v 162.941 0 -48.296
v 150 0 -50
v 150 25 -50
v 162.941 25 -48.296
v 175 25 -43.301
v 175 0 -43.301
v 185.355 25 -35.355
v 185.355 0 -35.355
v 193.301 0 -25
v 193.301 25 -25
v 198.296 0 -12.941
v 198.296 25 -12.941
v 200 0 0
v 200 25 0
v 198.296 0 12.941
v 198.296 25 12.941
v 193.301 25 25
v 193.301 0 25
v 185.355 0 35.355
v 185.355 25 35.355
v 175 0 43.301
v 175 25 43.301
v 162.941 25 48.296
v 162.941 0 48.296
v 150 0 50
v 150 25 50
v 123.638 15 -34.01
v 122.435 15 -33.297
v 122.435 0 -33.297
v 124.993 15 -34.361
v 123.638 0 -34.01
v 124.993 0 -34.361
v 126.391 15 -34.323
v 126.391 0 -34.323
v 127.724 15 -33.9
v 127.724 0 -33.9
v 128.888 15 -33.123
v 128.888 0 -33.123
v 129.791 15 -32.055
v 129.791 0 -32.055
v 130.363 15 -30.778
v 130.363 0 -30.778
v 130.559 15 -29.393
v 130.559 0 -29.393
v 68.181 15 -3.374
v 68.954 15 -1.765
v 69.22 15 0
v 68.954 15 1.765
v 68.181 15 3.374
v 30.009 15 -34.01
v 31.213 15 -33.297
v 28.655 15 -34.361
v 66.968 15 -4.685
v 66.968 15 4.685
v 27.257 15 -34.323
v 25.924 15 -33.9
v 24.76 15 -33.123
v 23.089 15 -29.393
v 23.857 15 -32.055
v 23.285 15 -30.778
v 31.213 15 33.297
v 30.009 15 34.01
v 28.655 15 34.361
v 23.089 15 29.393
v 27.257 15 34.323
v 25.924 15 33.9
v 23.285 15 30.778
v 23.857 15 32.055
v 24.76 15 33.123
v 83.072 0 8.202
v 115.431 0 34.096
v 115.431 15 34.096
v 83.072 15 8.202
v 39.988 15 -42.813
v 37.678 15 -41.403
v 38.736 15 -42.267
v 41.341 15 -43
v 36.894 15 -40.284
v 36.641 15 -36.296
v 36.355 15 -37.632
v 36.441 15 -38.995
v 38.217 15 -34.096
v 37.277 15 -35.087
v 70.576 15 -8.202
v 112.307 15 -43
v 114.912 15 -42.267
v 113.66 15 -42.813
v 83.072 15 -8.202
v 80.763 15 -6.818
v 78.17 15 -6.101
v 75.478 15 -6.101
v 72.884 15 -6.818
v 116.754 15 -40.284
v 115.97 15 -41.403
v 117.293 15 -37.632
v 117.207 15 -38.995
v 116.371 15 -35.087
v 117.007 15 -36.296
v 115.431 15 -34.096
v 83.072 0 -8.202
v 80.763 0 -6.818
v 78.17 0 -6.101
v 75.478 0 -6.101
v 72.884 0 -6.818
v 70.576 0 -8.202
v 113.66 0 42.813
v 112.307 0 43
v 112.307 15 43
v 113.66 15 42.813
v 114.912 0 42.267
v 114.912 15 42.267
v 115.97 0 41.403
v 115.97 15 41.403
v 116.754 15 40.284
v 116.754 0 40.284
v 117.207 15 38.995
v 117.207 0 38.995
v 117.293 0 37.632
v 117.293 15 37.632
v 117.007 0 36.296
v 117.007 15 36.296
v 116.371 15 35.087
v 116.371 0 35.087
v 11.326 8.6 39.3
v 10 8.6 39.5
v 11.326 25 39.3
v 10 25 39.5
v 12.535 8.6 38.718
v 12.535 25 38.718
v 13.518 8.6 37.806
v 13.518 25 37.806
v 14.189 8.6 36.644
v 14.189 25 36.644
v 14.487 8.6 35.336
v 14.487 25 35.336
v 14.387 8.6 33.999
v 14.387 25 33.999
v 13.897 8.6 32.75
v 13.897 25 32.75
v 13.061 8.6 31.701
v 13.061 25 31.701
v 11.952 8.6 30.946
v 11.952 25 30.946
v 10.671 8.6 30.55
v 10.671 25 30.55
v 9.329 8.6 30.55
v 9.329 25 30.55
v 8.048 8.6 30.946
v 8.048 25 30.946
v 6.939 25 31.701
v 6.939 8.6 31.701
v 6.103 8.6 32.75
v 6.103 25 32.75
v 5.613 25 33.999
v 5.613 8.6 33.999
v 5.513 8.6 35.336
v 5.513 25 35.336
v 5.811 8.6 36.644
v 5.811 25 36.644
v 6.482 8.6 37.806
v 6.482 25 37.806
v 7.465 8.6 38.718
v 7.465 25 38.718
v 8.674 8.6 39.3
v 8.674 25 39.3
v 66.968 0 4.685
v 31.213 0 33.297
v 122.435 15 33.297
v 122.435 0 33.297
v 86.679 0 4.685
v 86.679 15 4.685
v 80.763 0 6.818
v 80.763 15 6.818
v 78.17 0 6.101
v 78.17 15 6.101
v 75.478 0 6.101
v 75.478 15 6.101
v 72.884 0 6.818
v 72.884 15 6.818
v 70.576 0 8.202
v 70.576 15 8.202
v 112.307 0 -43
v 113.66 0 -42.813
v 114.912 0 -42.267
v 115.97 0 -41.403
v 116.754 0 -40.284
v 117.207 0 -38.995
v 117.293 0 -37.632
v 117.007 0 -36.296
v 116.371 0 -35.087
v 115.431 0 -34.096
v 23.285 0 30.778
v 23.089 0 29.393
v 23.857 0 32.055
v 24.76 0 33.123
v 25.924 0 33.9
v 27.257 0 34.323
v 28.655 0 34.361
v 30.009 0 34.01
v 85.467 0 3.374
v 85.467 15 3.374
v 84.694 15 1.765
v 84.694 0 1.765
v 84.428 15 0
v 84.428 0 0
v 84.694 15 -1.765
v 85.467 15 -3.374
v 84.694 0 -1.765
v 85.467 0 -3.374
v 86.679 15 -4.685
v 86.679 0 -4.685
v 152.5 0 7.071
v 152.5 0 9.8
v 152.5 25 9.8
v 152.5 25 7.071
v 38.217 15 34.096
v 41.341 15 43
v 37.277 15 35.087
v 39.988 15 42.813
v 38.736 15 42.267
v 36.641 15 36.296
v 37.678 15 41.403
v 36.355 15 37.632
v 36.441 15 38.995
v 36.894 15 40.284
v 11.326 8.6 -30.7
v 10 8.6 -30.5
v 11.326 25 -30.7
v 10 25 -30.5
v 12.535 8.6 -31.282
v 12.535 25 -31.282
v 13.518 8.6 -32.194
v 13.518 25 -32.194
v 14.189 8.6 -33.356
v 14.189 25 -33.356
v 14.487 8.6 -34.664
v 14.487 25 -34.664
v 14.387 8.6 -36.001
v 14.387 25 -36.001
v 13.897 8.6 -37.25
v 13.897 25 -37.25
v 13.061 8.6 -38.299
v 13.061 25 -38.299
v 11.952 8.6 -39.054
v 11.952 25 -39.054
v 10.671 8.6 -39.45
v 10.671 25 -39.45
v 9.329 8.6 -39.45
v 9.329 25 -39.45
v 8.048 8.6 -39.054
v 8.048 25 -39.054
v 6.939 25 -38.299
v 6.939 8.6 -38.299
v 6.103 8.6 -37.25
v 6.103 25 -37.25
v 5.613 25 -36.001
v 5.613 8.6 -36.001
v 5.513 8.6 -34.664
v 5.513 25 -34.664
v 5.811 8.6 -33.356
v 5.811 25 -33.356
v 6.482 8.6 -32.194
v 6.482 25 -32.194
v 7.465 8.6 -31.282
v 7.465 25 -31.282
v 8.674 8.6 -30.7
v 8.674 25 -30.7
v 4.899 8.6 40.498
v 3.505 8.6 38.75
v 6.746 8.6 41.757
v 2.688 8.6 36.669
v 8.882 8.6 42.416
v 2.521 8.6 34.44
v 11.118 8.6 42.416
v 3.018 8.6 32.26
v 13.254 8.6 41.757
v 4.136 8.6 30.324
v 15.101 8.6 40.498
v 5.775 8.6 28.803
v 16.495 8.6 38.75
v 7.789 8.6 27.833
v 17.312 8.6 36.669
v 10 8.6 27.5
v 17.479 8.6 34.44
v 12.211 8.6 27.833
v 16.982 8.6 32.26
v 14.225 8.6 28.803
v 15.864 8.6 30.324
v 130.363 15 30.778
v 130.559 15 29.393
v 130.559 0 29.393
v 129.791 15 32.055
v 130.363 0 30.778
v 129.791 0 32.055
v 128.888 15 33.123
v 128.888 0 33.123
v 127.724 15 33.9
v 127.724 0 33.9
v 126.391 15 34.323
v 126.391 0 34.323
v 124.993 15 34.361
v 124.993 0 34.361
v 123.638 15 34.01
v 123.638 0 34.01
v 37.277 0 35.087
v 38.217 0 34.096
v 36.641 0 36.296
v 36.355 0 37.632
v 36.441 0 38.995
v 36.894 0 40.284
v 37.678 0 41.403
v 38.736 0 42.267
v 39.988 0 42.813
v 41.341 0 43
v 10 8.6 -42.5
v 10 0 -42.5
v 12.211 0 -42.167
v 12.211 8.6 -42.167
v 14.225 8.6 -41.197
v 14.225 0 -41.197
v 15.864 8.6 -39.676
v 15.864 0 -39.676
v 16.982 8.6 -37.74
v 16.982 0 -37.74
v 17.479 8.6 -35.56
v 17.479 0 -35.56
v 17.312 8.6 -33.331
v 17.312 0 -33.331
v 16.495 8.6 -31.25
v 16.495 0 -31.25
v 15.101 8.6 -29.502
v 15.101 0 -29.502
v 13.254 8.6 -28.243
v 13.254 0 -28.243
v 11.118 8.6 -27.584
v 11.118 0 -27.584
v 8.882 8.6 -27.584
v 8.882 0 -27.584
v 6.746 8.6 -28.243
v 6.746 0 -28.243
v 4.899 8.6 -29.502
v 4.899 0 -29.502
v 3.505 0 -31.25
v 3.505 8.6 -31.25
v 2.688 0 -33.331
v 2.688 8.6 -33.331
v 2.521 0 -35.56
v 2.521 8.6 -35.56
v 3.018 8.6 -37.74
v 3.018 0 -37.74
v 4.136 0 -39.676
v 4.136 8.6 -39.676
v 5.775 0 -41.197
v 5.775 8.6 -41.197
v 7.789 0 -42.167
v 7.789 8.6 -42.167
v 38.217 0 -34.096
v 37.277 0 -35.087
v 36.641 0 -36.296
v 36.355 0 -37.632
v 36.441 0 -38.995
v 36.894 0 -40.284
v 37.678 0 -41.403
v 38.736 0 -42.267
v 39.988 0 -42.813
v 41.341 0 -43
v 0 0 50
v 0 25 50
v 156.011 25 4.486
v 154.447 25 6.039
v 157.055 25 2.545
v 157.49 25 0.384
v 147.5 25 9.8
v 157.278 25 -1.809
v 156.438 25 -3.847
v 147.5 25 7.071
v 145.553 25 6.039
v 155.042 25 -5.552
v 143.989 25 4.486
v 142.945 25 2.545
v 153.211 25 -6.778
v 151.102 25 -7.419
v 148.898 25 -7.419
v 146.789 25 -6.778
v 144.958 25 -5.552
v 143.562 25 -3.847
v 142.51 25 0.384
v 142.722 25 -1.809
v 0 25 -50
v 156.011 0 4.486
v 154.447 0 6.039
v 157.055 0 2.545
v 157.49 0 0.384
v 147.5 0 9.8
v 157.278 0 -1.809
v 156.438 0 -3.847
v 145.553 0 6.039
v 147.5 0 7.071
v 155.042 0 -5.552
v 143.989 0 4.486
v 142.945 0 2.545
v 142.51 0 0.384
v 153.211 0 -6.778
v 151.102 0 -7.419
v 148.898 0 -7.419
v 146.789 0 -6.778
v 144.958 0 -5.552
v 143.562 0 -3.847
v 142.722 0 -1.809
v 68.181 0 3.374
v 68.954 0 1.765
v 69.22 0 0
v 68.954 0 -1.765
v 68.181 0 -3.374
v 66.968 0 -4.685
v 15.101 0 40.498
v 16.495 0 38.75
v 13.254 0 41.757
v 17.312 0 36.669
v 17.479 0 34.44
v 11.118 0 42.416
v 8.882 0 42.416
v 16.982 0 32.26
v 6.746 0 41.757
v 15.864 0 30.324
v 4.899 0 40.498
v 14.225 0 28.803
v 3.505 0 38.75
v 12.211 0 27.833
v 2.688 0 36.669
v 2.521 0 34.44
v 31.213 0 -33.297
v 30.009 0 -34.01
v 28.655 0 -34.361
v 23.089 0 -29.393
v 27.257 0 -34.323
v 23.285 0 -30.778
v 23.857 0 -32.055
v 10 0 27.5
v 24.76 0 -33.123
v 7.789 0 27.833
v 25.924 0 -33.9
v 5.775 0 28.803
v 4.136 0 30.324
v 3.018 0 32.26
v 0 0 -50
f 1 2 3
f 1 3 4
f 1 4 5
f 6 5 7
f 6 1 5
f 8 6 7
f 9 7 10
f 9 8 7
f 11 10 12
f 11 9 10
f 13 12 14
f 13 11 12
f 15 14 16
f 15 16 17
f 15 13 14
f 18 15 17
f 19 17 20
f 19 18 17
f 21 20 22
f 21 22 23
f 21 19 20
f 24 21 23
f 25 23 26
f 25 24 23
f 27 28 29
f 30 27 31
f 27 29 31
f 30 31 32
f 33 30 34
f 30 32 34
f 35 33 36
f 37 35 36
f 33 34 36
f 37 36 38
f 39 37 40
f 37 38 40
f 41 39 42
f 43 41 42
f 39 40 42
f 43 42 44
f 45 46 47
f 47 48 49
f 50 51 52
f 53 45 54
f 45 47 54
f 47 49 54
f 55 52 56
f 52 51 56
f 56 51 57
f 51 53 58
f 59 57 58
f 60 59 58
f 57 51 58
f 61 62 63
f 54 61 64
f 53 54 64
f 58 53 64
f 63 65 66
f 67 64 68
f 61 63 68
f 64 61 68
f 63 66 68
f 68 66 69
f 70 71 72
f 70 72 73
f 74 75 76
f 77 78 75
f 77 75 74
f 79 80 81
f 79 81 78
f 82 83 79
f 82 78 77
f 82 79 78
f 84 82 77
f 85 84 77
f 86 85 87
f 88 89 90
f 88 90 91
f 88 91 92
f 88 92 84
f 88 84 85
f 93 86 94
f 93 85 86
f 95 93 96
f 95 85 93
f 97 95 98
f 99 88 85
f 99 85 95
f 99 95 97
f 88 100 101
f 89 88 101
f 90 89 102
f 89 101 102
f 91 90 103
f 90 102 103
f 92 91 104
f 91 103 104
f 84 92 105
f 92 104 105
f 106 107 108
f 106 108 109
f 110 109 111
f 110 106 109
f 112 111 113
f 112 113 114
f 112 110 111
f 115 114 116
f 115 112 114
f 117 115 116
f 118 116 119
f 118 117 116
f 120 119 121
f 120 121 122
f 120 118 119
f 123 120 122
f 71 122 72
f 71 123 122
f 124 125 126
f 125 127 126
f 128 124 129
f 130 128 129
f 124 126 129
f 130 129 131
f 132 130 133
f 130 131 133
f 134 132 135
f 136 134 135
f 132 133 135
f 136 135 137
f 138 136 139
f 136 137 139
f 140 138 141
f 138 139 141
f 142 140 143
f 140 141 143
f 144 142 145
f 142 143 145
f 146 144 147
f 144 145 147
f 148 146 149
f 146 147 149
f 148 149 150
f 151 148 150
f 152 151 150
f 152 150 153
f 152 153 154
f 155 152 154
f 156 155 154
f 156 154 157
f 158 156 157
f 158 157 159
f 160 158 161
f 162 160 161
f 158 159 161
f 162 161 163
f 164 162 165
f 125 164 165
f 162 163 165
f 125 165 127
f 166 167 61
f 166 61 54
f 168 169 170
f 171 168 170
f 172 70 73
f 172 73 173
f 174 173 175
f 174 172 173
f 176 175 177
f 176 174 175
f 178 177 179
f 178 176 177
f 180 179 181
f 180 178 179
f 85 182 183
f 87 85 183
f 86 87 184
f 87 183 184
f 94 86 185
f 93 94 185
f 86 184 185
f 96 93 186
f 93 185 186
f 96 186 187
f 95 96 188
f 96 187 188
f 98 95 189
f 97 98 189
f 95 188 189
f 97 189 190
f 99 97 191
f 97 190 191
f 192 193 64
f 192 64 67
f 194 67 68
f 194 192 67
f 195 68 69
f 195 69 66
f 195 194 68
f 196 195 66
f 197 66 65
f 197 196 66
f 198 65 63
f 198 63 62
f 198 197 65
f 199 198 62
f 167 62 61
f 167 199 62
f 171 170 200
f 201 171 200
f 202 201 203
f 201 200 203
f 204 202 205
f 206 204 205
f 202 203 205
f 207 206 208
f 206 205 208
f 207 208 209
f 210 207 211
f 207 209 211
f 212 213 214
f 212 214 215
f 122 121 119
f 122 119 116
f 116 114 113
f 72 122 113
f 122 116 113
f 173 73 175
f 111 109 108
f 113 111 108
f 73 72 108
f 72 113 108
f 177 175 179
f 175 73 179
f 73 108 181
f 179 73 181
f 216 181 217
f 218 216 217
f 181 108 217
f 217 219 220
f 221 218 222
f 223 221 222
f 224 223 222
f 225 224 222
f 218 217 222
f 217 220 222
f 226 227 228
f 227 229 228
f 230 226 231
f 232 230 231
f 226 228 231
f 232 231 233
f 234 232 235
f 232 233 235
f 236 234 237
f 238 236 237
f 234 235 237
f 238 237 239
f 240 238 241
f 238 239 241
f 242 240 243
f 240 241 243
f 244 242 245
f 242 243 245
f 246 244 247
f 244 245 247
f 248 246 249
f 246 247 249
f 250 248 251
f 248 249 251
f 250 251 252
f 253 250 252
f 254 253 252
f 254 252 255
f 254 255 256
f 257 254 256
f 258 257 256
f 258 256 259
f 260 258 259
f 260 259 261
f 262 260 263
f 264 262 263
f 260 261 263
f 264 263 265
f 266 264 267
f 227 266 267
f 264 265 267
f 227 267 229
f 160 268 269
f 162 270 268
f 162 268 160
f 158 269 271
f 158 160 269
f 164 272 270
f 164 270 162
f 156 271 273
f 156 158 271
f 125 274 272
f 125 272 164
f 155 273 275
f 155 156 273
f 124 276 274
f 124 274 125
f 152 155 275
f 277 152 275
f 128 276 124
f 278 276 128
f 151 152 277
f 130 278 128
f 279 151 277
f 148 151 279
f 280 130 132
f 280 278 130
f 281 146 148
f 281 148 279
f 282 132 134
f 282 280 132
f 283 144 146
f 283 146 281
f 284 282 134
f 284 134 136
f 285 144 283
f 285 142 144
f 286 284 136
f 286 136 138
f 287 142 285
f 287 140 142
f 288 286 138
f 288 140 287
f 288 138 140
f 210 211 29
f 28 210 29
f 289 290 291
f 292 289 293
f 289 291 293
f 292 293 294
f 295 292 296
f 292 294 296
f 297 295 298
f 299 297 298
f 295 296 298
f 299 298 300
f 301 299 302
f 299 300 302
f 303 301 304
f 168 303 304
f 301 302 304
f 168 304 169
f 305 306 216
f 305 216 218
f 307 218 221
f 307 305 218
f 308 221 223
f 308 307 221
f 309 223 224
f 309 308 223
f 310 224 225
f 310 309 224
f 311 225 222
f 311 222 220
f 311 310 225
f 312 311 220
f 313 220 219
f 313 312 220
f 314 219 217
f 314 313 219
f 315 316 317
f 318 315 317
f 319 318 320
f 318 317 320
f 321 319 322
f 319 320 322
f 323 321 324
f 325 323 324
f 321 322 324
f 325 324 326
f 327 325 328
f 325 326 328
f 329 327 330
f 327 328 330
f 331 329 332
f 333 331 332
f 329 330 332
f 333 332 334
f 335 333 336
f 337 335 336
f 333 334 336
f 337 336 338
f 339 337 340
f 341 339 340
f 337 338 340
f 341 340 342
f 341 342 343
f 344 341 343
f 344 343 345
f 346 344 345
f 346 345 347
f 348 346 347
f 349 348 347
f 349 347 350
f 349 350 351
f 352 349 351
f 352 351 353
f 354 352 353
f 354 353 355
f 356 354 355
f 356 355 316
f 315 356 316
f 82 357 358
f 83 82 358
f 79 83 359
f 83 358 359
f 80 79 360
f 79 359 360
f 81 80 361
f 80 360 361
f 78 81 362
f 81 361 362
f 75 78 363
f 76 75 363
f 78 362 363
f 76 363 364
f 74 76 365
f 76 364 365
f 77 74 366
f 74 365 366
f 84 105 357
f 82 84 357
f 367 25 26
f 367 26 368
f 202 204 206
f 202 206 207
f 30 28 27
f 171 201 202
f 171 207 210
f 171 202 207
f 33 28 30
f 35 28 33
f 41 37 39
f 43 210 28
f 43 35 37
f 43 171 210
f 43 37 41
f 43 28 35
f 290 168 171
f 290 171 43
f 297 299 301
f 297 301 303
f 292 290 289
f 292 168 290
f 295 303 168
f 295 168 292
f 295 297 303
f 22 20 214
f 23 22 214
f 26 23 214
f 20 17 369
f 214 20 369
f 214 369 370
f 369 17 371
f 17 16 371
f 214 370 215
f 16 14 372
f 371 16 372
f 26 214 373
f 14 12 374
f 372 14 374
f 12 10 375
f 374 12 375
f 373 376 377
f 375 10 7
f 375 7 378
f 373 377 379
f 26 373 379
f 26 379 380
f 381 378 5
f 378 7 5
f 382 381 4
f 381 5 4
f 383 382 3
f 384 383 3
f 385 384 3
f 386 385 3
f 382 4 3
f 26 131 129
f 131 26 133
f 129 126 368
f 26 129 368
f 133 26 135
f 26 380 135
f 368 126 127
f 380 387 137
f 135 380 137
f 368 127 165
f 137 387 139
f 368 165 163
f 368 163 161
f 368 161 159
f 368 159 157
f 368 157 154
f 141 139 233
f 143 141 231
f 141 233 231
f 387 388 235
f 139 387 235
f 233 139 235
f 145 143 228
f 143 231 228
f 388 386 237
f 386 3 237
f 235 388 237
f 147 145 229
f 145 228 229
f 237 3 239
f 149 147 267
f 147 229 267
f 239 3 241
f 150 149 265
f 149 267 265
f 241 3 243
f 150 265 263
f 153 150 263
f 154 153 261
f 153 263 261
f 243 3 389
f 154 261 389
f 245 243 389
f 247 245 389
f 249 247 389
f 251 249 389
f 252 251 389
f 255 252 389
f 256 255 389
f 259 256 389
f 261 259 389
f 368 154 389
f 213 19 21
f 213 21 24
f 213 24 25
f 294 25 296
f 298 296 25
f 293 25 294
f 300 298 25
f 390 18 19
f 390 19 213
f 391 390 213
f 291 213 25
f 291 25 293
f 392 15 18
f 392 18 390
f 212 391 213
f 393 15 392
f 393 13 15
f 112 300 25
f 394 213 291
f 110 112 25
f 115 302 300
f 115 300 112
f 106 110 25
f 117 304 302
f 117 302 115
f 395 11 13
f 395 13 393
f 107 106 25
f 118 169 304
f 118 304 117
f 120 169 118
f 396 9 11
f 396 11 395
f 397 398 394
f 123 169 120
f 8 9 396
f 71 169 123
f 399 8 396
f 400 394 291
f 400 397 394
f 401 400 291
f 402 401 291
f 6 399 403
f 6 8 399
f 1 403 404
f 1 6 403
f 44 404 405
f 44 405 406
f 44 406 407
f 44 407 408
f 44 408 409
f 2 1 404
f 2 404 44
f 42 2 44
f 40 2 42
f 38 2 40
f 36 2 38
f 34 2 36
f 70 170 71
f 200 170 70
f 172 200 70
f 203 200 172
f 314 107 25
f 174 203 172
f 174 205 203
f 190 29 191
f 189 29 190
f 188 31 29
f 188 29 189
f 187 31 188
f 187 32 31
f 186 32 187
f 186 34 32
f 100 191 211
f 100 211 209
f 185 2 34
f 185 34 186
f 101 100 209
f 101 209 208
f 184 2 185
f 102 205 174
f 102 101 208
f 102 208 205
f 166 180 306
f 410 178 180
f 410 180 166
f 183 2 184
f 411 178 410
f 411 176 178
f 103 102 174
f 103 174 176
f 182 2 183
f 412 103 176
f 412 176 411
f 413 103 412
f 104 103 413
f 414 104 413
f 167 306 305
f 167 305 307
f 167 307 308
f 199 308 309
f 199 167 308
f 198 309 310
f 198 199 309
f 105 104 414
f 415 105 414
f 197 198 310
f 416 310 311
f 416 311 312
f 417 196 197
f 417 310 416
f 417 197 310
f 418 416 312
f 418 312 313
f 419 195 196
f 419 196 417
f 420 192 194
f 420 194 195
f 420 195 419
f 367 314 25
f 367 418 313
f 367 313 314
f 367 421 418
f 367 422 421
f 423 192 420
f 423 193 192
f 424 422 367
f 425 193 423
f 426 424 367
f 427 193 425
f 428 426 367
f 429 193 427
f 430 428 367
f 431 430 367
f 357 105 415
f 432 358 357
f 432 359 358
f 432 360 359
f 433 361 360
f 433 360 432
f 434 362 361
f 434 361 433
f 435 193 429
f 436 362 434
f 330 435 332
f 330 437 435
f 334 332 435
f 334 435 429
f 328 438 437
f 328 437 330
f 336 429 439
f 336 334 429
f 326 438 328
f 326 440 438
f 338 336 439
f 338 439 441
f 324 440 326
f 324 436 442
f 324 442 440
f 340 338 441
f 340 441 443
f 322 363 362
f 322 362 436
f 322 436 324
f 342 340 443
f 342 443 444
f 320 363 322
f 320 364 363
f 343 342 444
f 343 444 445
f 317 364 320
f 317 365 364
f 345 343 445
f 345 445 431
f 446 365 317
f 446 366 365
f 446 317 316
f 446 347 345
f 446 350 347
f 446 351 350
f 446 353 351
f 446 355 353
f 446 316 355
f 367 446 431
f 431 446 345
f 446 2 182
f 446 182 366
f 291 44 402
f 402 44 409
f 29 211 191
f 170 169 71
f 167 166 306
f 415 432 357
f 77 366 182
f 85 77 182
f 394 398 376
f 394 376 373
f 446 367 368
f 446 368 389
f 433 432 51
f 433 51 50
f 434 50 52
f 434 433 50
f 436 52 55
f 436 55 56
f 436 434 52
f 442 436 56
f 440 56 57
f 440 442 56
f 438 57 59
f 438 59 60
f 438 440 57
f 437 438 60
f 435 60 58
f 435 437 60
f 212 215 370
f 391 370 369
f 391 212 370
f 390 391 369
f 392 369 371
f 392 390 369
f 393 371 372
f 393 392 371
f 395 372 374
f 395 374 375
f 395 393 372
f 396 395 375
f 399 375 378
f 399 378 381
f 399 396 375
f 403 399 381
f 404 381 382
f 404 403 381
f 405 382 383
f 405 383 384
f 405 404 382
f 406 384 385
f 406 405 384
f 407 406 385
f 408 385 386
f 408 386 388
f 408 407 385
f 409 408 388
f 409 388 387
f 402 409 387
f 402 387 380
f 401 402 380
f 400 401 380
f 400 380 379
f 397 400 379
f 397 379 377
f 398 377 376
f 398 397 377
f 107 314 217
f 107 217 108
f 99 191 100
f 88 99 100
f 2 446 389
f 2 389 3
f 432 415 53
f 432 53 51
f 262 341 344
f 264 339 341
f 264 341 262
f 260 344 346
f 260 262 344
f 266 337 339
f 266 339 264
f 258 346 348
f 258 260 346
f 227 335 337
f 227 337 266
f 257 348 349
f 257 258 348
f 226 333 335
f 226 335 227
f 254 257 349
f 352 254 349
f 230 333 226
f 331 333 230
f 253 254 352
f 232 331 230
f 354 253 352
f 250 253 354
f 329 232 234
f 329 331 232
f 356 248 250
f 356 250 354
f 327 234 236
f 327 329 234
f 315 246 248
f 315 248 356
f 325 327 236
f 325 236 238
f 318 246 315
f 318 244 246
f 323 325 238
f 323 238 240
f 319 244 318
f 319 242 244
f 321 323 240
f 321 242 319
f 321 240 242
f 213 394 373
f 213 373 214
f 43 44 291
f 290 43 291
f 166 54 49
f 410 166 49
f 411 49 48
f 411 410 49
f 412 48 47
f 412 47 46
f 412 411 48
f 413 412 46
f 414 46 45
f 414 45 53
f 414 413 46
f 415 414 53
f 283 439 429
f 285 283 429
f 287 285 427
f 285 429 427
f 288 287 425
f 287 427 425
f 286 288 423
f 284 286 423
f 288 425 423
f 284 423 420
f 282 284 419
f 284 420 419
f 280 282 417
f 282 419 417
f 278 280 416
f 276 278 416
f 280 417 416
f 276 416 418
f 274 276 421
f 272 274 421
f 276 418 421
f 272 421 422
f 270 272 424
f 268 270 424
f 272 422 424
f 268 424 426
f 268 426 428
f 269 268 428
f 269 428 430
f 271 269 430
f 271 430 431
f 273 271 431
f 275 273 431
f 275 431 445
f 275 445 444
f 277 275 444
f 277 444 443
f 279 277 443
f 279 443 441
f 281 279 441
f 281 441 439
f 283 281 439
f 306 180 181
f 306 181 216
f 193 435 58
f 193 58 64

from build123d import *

# Parameters (mm, degrees)
DODANIE_WYCI_GNI_CIE1_DEPTH                         = 25
POG_BIENIE_WALCOWE_POD_M8_WKR_T_Z_BEM_W_D           = 9
POG_BIENIE_WALCOWE_POD_M8_WKR_T_Z_BEM_W_DEPTH       = 26.25
POG_BIENIE_WALCOWE_POD_M8_WKR_T_Z_BEM_W_CBORE_D     = 15
POG_BIENIE_WALCOWE_POD_M8_WKR_T_Z_BEM_W_CBORE_DEPTH = 8.6
POG_BIENIE_WALCOWE_POD_M8_WKR_T_Z_BEM_W_TIP         = 2.703872786
WYTNIJ_WYCI_GNI_CIE1_DEPTH                          = 15


with BuildPart() as part:
    # Szkic1 → Dodanie-wyciągnięcie1 (new body)
    with BuildSketch(Plane(origin=(0, 0, 0), x_dir=(1, 0, 0), z_dir=(0, 1, 0))):
        with BuildLine():
            Line((0, -50), (0, 50))
            Line((0, 50), (150, 50))
            ThreePointArc((150, 50), (200, 0), (150, -50))
            Line((150, -50), (0, -50))
        make_face()
        with BuildLine():
            Line((147.5, -9.8), (152.5, -9.8))
            Line((152.5, -9.8), (152.5, -7.071067812))
            ThreePointArc((152.5, -7.071067812), (150, 7.5), (147.5, -7.071067812))
            Line((147.5, -7.071067812), (147.5, -9.8))
        make_face(mode=Mode.SUBTRACT)
    extrude(amount=DODANIE_WYCI_GNI_CIE1_DEPTH)

    # Pogłębienie walcowe pod M8 Wkręt z łbem walcowym z gniazdem sześciokątnym1
    with Locations(Plane(origin=(10, 0, 35), x_dir=(0, 0, -1), z_dir=(0, -1, 0))):
        with Locations((0, 0), (70, 0)):
            CounterBoreHole(POG_BIENIE_WALCOWE_POD_M8_WKR_T_Z_BEM_W_D / 2, POG_BIENIE_WALCOWE_POD_M8_WKR_T_Z_BEM_W_CBORE_D / 2, POG_BIENIE_WALCOWE_POD_M8_WKR_T_Z_BEM_W_CBORE_DEPTH, depth=POG_BIENIE_WALCOWE_POD_M8_WKR_T_Z_BEM_W_DEPTH)
            with Locations((0, 0, -(POG_BIENIE_WALCOWE_POD_M8_WKR_T_Z_BEM_W_DEPTH + POG_BIENIE_WALCOWE_POD_M8_WKR_T_Z_BEM_W_TIP / 2))):  # 118° drill point
                Cone(0, POG_BIENIE_WALCOWE_POD_M8_WKR_T_Z_BEM_W_D / 2, POG_BIENIE_WALCOWE_POD_M8_WKR_T_Z_BEM_W_TIP, mode=Mode.SUBTRACT)

    # Szkic4 → Wytnij-wyciągnięcie1 (cut)
    with BuildSketch(Plane.XZ):
        with BuildLine():
            Line((31.213273393, 33.297016557), (66.968494236, 4.684692061))
            ThreePointArc((66.968494236, 4.684692061), (69.219673049, 0), (66.968494236, -4.684692061))
            Line((66.968494236, -4.684692061), (31.213273393, -33.297016557))
            ThreePointArc((31.213273393, -33.297016557), (25.923625146, -33.899773139), (23.089255738, -29.393106506))
            Line((23.089255738, -29.393106506), (23.089255738, 29.393106506))
            ThreePointArc((23.089255738, 29.393106506), (25.923625146, 33.899773139), (31.213273393, 33.297016557))
        make_face()
        with BuildLine():
            Line((41.341249338, -43), (112.306649775, -43))
            ThreePointArc((112.306649775, -43), (117.024676389, -39.655362459), (115.430667431, -34.096089949))
            Line((115.430667431, -34.096089949), (83.071984868, -8.201770072))
            ThreePointArc((83.071984868, -8.201770072), (76.823949557, -6.009590175), (70.575914246, -8.201770072))
            Line((70.575914246, -8.201770072), (38.217231683, -34.096089949))
            ThreePointArc((38.217231683, -34.096089949), (36.623222725, -39.655362459), (41.341249338, -43))
        make_face()
        with BuildLine():
            Line((130.558643376, -29.393106506), (130.558643376, 29.393106506))
            ThreePointArc((130.558643376, 29.393106506), (127.724273968, 33.899773139), (122.43462572, 33.297016557))
            Line((122.43462572, 33.297016557), (86.679404878, 4.684692061))
            ThreePointArc((86.679404878, 4.684692061), (84.428226064, 0), (86.679404878, -4.684692061))
            Line((86.679404878, -4.684692061), (122.43462572, -33.297016557))
            ThreePointArc((122.43462572, -33.297016557), (127.724273968, -33.899773139), (130.558643376, -29.393106506))
        make_face()
        with BuildLine():
            Line((41.341249338, 43), (112.306649775, 43))
            ThreePointArc((112.306649775, 43), (117.024676389, 39.655362459), (115.430667431, 34.096089949))
            Line((115.430667431, 34.096089949), (83.071984868, 8.201770072))
            ThreePointArc((83.071984868, 8.201770072), (76.823949557, 6.009590175), (70.575914246, 8.201770072))
            Line((70.575914246, 8.201770072), (38.217231683, 34.096089949))
            ThreePointArc((38.217231683, 34.096089949), (36.623222725, 39.655362459), (41.341249338, 43))
        make_face()
    extrude(amount=-WYTNIJ_WYCI_GNI_CIE1_DEPTH, mode=Mode.SUBTRACT)


solid = part.part
